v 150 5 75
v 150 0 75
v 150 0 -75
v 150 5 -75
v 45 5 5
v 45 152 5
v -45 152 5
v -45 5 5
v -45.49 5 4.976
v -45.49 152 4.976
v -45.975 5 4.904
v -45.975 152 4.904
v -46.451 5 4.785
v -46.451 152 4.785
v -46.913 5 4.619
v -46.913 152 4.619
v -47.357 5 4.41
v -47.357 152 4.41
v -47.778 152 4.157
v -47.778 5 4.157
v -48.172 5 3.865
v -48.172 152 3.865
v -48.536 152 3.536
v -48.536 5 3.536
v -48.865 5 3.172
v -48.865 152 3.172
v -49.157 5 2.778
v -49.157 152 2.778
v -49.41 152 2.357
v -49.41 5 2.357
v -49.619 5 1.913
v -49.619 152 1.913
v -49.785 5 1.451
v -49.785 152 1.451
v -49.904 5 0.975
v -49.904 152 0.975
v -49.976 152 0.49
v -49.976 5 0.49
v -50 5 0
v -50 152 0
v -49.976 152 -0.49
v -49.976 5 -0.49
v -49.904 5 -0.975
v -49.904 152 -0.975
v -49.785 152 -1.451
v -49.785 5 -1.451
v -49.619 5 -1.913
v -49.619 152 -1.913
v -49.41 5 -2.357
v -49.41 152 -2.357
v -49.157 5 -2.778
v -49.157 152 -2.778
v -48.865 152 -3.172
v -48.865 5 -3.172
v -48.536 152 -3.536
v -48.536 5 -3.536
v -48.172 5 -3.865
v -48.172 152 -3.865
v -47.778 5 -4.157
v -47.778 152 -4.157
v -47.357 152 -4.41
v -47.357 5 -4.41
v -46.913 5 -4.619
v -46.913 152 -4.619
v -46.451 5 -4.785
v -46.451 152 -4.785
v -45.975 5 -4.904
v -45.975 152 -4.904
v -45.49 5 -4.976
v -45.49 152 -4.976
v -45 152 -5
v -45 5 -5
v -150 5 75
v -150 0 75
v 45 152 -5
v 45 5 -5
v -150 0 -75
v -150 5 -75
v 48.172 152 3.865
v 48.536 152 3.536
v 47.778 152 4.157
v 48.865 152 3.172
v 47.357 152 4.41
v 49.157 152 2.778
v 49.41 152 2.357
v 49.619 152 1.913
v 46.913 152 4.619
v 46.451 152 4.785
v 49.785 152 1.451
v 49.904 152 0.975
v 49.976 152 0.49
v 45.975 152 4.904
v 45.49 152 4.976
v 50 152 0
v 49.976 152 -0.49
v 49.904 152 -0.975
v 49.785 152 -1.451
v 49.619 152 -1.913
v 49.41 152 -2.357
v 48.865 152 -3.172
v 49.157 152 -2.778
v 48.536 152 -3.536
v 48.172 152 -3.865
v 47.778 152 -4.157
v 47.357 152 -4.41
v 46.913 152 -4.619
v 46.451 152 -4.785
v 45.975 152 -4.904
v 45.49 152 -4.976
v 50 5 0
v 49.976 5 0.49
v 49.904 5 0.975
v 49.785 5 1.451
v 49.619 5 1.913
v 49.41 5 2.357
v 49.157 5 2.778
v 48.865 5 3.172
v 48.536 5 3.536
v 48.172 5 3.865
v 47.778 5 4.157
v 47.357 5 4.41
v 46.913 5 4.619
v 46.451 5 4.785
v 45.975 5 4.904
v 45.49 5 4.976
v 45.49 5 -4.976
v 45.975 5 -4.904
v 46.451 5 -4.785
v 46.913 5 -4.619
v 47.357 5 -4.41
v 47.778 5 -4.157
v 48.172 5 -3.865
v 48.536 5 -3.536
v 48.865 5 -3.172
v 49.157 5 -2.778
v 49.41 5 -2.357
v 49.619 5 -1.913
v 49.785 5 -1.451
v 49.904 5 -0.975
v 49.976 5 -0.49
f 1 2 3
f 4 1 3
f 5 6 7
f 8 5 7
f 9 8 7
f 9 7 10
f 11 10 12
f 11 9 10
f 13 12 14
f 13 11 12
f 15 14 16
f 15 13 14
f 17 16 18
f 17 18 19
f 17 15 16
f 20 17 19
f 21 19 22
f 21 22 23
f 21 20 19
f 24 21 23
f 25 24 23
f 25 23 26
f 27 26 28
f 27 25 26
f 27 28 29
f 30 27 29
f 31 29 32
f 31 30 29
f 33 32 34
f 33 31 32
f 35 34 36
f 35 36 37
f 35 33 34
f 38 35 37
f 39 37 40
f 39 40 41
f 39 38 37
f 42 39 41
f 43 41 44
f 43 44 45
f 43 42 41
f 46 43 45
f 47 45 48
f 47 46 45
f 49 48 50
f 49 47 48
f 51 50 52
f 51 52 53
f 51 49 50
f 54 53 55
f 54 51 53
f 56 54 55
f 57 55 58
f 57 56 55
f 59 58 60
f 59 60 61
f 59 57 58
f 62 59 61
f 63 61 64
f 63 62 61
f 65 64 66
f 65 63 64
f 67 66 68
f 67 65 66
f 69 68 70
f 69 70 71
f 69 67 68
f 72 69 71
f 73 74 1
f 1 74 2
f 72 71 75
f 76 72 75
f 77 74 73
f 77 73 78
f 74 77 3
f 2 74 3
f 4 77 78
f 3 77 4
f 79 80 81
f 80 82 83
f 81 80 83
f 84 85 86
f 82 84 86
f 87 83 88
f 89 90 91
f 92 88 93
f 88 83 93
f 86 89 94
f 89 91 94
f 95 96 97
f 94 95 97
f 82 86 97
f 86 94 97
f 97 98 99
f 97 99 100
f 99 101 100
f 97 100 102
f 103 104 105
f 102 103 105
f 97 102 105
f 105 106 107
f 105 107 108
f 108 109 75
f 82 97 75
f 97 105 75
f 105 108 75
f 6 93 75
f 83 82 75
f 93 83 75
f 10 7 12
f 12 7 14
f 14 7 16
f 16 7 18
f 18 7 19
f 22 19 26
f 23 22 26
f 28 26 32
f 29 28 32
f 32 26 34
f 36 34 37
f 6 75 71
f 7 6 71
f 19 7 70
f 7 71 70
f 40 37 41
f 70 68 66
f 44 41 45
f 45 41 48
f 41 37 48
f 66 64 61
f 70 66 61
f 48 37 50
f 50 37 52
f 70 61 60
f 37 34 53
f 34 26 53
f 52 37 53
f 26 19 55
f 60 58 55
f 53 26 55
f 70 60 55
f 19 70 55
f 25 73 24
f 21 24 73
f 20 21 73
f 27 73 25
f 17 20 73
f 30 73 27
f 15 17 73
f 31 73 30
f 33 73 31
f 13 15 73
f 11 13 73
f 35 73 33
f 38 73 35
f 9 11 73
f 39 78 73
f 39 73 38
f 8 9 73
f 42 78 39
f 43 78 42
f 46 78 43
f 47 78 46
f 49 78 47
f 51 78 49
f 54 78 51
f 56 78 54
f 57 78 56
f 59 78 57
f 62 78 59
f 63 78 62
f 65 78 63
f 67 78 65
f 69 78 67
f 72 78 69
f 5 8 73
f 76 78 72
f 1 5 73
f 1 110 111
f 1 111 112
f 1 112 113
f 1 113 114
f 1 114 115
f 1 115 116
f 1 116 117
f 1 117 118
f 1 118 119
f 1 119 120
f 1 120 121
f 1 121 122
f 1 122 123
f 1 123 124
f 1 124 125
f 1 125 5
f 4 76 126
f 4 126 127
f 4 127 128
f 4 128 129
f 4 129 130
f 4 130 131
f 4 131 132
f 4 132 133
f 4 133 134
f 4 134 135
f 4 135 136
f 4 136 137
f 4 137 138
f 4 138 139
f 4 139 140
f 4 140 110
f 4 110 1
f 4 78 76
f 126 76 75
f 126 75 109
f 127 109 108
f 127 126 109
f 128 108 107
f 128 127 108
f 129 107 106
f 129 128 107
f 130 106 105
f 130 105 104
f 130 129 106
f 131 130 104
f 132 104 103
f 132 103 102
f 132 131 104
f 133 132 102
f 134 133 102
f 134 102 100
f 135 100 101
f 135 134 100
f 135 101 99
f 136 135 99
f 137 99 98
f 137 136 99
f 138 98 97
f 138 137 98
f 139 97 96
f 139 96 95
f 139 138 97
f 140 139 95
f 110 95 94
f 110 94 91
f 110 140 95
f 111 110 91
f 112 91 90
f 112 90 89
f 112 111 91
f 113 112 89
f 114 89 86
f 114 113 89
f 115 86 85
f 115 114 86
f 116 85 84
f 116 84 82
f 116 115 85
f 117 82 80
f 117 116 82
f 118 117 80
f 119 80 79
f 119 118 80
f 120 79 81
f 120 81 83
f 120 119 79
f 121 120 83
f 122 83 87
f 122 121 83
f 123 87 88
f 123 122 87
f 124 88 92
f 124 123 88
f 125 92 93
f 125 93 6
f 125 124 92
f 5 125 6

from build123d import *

# Parameters (mm, degrees)
SKETCH1_W           = 300
SKETCH1_H           = 150
BOSS_EXTRUDE1_DEPTH = 5
BOSS_EXTRUDE2_DEPTH = 147


with BuildPart() as part:
    # Sketch1 → Boss-Extrude1 (new body)
    with BuildSketch(Plane(origin=(0, 0, 0), x_dir=(1, 0, 0), z_dir=(0, 1, 0))):
        Rectangle(SKETCH1_W, SKETCH1_H)
    extrude(amount=BOSS_EXTRUDE1_DEPTH)

    # Sketch2 → Boss-Extrude2 (add)
    with BuildSketch(Plane(origin=(0, 5, 0), x_dir=(1, 0, 0), z_dir=(0, 1, 0))):
        with BuildLine():
            Line((-45, 5), (45, 5))
            ThreePointArc((45, 5), (50, 0), (45, -5))
            Line((45, -5), (-45, -5))
            ThreePointArc((-45, -5), (-50, 0), (-45, 5))
        make_face()
    extrude(amount=BOSS_EXTRUDE2_DEPTH)


solid = part.part
